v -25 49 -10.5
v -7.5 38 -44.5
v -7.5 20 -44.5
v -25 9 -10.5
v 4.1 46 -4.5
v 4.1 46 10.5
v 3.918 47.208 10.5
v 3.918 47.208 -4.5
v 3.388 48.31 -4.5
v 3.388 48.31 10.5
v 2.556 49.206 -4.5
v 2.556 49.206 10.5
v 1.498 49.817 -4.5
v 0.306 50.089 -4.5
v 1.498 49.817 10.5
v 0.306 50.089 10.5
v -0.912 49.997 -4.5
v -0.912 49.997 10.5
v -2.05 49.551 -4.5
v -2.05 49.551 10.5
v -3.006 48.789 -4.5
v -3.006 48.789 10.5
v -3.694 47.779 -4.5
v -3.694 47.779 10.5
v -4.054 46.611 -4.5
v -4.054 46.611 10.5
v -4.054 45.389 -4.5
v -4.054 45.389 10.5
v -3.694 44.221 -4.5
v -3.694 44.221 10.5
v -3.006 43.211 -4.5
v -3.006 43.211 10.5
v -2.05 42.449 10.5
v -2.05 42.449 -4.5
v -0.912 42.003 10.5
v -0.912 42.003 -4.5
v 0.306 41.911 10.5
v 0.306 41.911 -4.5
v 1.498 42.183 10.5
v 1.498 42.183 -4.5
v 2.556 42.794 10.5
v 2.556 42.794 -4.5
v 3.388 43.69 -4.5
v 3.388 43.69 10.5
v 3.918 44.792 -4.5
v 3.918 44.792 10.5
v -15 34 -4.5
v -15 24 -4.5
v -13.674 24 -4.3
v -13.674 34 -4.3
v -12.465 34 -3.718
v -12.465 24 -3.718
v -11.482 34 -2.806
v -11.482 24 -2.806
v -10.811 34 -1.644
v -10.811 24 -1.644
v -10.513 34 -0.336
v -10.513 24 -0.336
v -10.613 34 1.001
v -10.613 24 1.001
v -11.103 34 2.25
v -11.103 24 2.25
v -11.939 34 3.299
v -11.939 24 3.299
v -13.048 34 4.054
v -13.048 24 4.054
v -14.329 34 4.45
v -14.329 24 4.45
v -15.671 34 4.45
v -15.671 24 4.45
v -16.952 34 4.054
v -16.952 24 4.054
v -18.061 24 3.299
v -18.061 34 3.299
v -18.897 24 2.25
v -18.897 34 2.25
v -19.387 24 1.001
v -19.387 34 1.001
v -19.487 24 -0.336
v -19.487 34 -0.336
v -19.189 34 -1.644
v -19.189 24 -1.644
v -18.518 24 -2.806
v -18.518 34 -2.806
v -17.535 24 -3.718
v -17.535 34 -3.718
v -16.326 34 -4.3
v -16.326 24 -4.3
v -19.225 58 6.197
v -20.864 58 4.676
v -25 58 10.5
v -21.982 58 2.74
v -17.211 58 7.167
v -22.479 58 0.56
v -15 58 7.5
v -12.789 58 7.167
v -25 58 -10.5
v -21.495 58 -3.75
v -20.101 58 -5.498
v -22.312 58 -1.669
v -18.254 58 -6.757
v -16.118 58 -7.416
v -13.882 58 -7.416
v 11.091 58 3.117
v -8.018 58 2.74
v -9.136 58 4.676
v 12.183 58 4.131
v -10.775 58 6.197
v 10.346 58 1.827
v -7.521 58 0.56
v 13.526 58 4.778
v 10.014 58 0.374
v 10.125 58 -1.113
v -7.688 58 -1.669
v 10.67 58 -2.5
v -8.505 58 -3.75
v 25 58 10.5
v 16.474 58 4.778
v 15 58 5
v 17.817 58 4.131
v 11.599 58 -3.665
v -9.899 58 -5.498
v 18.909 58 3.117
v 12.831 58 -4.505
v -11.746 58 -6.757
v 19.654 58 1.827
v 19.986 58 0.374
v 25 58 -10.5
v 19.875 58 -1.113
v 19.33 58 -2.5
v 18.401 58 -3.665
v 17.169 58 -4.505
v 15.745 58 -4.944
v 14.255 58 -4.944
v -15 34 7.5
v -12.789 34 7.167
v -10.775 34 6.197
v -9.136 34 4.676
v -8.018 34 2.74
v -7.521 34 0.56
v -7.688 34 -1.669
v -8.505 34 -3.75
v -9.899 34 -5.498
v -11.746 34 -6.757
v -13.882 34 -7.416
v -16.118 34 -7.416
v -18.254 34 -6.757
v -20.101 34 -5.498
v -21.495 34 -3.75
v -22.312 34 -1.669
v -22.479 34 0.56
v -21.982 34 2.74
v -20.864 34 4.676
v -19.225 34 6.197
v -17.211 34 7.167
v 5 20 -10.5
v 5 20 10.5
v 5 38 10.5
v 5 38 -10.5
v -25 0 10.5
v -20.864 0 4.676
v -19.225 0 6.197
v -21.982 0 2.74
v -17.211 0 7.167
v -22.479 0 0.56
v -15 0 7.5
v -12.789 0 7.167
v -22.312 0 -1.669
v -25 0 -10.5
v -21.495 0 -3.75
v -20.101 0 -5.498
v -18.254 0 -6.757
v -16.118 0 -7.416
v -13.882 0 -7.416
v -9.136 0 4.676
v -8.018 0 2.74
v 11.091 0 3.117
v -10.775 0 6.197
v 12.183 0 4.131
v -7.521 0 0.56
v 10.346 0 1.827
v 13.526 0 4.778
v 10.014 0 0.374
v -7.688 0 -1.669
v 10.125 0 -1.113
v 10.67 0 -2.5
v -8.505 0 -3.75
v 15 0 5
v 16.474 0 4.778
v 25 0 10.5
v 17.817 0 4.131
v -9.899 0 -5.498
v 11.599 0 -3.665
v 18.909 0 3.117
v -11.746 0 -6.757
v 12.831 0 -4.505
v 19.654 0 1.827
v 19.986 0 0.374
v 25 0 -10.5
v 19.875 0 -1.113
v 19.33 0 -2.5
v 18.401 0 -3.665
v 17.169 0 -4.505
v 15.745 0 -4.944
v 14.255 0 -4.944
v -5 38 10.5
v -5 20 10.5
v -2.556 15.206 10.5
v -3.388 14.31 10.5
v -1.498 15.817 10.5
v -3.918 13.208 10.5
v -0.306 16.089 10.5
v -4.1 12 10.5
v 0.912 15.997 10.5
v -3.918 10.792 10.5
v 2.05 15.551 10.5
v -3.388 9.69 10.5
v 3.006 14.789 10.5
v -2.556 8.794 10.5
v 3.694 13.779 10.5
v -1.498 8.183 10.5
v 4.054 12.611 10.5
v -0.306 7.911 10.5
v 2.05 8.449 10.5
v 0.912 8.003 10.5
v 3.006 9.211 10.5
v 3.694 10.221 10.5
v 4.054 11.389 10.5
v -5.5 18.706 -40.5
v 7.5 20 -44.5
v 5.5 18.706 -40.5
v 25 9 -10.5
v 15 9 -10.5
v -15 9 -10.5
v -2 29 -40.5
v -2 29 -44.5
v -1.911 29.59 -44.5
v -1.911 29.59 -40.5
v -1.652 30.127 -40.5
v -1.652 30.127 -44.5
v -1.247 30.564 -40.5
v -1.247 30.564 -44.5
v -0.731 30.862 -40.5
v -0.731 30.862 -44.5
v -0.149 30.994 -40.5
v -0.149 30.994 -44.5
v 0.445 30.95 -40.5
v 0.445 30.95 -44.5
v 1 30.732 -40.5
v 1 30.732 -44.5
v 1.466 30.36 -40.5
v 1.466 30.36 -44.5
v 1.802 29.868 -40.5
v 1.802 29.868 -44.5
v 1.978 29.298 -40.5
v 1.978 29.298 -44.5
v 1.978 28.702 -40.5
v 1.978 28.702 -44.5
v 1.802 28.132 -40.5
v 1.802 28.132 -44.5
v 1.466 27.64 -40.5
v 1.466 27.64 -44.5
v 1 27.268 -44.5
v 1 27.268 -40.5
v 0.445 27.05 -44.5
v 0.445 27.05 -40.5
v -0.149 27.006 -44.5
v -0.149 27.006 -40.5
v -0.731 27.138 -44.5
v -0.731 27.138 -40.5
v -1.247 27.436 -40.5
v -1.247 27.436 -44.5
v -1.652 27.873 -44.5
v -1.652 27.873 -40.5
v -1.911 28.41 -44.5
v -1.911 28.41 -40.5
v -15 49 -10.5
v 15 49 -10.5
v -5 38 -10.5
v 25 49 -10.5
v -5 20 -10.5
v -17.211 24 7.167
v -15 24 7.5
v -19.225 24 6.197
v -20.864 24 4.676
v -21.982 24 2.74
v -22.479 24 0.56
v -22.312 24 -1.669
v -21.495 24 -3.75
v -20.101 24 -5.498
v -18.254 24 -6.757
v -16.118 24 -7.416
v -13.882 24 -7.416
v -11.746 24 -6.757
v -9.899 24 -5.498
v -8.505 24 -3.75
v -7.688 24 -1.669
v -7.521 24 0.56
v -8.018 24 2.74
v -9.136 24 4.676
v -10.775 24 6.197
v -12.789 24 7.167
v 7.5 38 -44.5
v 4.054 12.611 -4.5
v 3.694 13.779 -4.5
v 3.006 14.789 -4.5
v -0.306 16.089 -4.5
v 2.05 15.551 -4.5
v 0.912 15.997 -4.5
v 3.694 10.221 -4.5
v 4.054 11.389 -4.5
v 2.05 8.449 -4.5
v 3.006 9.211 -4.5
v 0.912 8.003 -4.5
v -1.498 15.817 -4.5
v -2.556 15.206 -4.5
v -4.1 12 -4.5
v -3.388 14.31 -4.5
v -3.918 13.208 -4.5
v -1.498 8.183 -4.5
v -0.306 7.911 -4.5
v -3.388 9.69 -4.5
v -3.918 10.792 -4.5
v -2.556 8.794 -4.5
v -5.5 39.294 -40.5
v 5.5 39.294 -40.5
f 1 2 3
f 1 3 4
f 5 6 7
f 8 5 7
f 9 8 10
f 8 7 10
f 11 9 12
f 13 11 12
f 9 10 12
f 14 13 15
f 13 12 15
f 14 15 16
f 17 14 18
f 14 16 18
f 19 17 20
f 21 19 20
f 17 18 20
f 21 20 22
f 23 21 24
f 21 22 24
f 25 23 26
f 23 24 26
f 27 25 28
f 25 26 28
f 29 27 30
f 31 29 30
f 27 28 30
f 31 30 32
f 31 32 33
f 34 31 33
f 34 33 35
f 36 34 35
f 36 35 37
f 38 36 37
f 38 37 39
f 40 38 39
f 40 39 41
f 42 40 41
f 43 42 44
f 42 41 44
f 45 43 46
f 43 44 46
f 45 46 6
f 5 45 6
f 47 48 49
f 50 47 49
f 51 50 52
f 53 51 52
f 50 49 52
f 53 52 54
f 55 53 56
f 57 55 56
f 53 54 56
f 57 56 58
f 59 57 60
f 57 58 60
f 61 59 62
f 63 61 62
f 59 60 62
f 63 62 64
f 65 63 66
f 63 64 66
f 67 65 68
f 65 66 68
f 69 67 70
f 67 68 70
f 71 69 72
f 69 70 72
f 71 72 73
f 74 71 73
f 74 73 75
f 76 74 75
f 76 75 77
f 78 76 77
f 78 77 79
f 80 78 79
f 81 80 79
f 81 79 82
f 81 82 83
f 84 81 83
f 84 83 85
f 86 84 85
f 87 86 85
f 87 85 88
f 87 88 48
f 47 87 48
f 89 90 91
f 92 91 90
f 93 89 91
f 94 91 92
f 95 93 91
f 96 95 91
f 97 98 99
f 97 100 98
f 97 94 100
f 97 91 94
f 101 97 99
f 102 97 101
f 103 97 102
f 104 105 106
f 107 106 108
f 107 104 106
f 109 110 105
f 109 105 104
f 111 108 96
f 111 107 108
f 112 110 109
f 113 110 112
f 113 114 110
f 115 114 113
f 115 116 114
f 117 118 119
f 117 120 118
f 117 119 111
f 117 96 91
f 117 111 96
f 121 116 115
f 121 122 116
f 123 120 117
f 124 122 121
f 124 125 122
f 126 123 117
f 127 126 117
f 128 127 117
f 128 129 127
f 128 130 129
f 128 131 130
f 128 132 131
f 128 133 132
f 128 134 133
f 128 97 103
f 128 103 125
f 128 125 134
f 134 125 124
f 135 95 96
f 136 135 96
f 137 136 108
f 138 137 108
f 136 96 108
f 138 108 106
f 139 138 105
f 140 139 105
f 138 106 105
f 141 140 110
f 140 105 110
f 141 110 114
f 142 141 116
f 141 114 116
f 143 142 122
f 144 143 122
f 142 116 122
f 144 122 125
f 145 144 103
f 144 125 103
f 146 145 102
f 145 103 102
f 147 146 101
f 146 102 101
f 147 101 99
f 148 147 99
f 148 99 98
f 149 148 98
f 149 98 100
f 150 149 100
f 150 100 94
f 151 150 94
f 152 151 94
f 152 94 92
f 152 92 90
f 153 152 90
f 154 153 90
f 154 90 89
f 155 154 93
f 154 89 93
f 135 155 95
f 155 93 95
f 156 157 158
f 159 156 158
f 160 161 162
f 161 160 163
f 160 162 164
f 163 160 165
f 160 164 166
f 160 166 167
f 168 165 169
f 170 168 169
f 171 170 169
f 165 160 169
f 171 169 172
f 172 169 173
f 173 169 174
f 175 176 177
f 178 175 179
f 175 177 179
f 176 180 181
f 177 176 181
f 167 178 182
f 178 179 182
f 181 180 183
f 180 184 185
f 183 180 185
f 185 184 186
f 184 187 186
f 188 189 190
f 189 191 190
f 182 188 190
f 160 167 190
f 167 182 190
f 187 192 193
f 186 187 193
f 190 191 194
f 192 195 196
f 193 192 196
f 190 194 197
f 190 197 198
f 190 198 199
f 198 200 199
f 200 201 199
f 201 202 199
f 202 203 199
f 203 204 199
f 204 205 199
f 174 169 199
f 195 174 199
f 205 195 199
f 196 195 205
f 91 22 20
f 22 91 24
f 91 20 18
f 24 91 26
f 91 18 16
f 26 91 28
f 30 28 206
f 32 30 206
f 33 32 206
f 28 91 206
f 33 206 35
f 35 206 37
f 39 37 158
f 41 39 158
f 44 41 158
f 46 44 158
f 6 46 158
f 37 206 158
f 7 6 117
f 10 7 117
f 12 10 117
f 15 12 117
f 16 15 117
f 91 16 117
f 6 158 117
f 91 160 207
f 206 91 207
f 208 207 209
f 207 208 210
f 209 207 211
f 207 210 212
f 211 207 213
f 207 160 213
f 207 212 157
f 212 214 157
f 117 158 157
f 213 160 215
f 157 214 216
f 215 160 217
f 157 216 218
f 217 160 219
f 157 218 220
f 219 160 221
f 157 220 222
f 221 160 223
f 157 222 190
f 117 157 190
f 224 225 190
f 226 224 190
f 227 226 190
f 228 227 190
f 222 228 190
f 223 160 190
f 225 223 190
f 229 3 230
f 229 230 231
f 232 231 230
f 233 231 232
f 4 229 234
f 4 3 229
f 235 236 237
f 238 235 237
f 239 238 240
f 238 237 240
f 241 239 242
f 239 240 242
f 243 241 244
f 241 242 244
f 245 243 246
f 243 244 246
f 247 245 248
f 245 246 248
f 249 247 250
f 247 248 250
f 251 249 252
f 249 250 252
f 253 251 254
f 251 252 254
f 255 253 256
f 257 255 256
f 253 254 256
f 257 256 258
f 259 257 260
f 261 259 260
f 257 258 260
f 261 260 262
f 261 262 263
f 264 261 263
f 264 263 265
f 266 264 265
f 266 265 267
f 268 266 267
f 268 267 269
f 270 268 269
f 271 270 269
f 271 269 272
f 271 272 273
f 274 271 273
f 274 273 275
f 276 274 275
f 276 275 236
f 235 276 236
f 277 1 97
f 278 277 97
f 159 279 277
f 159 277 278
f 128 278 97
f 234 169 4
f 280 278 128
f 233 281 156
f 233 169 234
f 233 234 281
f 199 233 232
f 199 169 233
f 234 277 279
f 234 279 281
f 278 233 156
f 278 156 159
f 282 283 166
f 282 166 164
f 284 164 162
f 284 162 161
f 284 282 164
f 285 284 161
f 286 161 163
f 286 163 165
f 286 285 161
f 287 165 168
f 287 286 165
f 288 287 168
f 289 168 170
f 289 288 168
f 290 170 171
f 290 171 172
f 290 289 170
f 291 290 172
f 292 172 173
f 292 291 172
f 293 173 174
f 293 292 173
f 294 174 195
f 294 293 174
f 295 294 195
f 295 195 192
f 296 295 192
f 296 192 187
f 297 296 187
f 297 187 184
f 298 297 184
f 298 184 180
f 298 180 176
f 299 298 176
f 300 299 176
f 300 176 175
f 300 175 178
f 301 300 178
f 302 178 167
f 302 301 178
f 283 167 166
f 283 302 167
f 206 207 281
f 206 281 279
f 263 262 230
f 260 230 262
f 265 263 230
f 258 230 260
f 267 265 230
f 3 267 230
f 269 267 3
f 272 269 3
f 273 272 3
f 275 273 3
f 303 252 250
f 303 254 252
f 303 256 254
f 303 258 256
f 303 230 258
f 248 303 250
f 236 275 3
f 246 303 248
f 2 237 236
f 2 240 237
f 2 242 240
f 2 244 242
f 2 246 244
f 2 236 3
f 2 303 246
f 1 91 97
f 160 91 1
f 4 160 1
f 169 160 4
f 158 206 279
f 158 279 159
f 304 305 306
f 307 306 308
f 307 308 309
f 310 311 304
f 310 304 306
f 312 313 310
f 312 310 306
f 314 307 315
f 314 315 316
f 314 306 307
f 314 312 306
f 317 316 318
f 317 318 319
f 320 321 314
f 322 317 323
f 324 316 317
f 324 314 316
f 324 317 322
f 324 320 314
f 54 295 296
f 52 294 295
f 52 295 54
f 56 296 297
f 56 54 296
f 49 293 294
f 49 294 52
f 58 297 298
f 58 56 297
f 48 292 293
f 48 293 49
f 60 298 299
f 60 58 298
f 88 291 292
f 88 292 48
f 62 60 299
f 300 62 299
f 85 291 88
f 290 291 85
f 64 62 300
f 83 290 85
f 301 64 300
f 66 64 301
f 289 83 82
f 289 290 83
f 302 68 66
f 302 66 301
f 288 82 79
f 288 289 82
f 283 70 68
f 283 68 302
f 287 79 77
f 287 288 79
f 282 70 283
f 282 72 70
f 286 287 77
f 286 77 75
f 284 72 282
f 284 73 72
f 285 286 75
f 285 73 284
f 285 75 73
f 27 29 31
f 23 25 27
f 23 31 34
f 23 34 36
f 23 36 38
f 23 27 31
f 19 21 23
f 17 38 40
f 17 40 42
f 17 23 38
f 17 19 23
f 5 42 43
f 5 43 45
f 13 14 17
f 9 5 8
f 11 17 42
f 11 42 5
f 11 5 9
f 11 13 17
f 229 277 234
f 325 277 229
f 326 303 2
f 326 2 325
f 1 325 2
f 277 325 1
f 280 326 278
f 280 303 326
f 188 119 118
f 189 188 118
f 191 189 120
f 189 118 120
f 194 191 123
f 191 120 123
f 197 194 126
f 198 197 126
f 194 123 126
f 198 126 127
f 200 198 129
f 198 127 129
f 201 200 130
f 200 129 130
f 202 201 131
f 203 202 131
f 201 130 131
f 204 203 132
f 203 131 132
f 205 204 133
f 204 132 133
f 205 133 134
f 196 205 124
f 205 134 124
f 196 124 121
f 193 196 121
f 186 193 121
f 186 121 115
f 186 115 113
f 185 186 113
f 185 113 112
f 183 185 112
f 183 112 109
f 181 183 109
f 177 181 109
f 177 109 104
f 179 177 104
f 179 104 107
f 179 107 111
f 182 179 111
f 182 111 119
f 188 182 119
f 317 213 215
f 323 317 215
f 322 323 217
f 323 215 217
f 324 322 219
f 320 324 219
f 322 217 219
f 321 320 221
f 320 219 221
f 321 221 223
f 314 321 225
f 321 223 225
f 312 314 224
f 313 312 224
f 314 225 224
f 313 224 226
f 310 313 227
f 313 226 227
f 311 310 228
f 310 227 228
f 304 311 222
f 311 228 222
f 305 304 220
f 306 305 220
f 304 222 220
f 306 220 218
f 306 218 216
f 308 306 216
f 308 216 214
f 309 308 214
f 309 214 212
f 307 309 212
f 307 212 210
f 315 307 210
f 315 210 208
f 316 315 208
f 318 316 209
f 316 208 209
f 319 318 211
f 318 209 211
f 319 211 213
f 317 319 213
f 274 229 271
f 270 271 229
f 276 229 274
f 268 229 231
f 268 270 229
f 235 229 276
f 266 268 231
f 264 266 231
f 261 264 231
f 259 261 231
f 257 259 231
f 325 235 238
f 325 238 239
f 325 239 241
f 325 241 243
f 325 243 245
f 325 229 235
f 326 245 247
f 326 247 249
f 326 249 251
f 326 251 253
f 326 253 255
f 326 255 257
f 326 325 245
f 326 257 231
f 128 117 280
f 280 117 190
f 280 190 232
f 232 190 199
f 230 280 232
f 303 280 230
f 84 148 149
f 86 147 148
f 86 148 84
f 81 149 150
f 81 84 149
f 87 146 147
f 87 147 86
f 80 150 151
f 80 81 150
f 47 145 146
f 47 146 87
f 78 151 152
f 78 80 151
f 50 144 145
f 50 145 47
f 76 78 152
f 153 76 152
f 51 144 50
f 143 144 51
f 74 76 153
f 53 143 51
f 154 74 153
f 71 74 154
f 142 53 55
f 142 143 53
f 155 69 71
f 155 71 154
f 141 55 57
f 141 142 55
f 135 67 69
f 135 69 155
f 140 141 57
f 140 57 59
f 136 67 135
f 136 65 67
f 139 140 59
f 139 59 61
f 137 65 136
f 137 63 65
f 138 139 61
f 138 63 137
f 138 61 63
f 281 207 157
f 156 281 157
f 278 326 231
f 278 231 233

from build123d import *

# Parameters (mm, degrees)
SKETCH1_W           = 50
SKETCH1_H           = 21
BOSS_EXTRUDE1_DEPTH = 58
SKETCH3_R           = 7.5
CUT_EXTRUDE1_DEPTH  = 24
CUT_EXTRUDE2_REACH  = 66.025
SKETCH4_R           = 5
CUT_EXTRUDE3_START  = -24
SKETCH5_R           = 7.5
CUT_EXTRUDE3_DEPTH  = 24
CUT_EXTRUDE4_REACH  = 66.025
SKETCH6_R           = 4.5
CUT_EXTRUDE5_REACH  = 68.558
SKETCH8_W           = 10
SKETCH8_H           = 18
BOSS_EXTRUDE3_DEPTH = 20
CUT_EXTRUDE6_DEPTH  = 37.5
CUT_EXTRUDE7_REACH  = 85.75
SKETCH13_R          = 2
SKETCH7_R           = 4.1
CUT_EXTRUDE8_DEPTH  = 15


with BuildPart() as part:
    # Sketch1 → Boss-Extrude1 (new body)
    with BuildSketch(Plane(origin=(0, 0, 0), x_dir=(1, 0, 0), z_dir=(0, 1, 0))):
        Rectangle(SKETCH1_W, SKETCH1_H)
    extrude(amount=BOSS_EXTRUDE1_DEPTH)

    # Sketch3 → Cut-Extrude1 (cut)
    with BuildSketch(Plane(origin=(0, 58, 0), x_dir=(1, 0, 0), z_dir=(0, 1, 0))):
        with Locations(Location((-15, 0, 0), (0, 0, 270))):
            Circle(SKETCH3_R)
    extrude(amount=-CUT_EXTRUDE1_DEPTH, mode=Mode.SUBTRACT)

    # Sketch4 → Cut-Extrude2 (cut, up to next)
    with BuildSketch(Plane(origin=(0, 58, 0), x_dir=(1, 0, 0), z_dir=(0, 1, 0)), mode=Mode.PRIVATE) as cut_extrude2_sk1:
        with Locations(Location((15, 0, 0), (0, 0, 270))):
            Circle(SKETCH4_R)
    cut_extrude2_tool1 = extrude(cut_extrude2_sk1.sketch, amount=-CUT_EXTRUDE2_REACH, mode=Mode.PRIVATE) & part.part
    add(cut_extrude2_tool1.solids().sort_by_distance((15, 58, 0))[0], mode=Mode.SUBTRACT)

    # Sketch5 → Cut-Extrude3 (cut)
    with BuildSketch(Plane.XZ.offset(CUT_EXTRUDE3_START)):
        with Locations(Location((-15, 0, 0), (0, 0, 90))):
            Circle(SKETCH5_R)
    extrude(amount=CUT_EXTRUDE3_DEPTH, mode=Mode.SUBTRACT)

    # Sketch6 → Cut-Extrude4 (cut, up to next)
    with BuildSketch(Plane.XZ, mode=Mode.PRIVATE) as cut_extrude4_sk1:
        with Locations(Location((-15, 0, 0), (0, 0, 270))):
            Circle(SKETCH6_R)
    cut_extrude4_tool1 = extrude(cut_extrude4_sk1.sketch, amount=-CUT_EXTRUDE4_REACH, mode=Mode.PRIVATE) & part.part
    add(cut_extrude4_tool1.solids().sort_by_distance((-15, 0, 0))[0], mode=Mode.SUBTRACT)

    # Sketch8 → Cut-Extrude5 (cut, up to next)
    with BuildSketch(Plane.XY.offset(10.5), mode=Mode.PRIVATE) as cut_extrude5_sk1:
        with Locations((0, 29)):
            Rectangle(SKETCH8_W, SKETCH8_H)
    cut_extrude5_tool1 = extrude(cut_extrude5_sk1.sketch, amount=-CUT_EXTRUDE5_REACH, mode=Mode.PRIVATE) & part.part
    add(cut_extrude5_tool1.solids().sort_by_distance((0, 29, 10.5))[0], mode=Mode.SUBTRACT)

    # Sketch11 → Boss-Extrude3 (add, symmetric)
    with BuildSketch(Plane(origin=(0, 29, 0), x_dir=(0, 0, -1), z_dir=(0, 1, 0))):
        Polygon((40.5, 5.5), (40.5, -5.5), (10.5, -15), (10.5, -25), (44.5, -7.5), (44.5, 7.5), (10.5, 25), (10.5, 15), align=None)
    extrude(amount=BOSS_EXTRUDE3_DEPTH, both=True)

    # Sketch12 → Cut-Extrude6 (cut, symmetric)
    with BuildSketch(Plane.ZY):
        Polygon((-44.5, 38), (-10.5, 49), (-44.5, 49), align=None)
        Polygon((-44.5, 20), (-10.5, 9), (-44.5, 9), align=None)
    extrude(amount=CUT_EXTRUDE6_DEPTH, both=True, mode=Mode.SUBTRACT)

    # Sketch13 → Cut-Extrude7 (cut, up to next)
    with BuildSketch(Plane(origin=(0, 0, -44.5), x_dir=(-1, 0, 0), z_dir=(0, 0, -1)), mode=Mode.PRIVATE) as cut_extrude7_sk1:
        with Locations((0, 29)):
            Circle(SKETCH13_R)
    cut_extrude7_tool1 = extrude(cut_extrude7_sk1.sketch, amount=-CUT_EXTRUDE7_REACH, mode=Mode.PRIVATE) & part.part
    add(cut_extrude7_tool1.solids().sort_by_distance((0, 29, -44.5))[0], mode=Mode.SUBTRACT)

    # Sketch7 → Cut-Extrude8 (cut)
    with BuildSketch(Plane.XY.offset(10.5)):
        with Locations((0, 46)):
            Circle(SKETCH7_R)
        with Locations(Location((0, 12, 0), (0, 0, 180))):
            Circle(SKETCH7_R)
    extrude(amount=-CUT_EXTRUDE8_DEPTH, mode=Mode.SUBTRACT)


solid = part.part
